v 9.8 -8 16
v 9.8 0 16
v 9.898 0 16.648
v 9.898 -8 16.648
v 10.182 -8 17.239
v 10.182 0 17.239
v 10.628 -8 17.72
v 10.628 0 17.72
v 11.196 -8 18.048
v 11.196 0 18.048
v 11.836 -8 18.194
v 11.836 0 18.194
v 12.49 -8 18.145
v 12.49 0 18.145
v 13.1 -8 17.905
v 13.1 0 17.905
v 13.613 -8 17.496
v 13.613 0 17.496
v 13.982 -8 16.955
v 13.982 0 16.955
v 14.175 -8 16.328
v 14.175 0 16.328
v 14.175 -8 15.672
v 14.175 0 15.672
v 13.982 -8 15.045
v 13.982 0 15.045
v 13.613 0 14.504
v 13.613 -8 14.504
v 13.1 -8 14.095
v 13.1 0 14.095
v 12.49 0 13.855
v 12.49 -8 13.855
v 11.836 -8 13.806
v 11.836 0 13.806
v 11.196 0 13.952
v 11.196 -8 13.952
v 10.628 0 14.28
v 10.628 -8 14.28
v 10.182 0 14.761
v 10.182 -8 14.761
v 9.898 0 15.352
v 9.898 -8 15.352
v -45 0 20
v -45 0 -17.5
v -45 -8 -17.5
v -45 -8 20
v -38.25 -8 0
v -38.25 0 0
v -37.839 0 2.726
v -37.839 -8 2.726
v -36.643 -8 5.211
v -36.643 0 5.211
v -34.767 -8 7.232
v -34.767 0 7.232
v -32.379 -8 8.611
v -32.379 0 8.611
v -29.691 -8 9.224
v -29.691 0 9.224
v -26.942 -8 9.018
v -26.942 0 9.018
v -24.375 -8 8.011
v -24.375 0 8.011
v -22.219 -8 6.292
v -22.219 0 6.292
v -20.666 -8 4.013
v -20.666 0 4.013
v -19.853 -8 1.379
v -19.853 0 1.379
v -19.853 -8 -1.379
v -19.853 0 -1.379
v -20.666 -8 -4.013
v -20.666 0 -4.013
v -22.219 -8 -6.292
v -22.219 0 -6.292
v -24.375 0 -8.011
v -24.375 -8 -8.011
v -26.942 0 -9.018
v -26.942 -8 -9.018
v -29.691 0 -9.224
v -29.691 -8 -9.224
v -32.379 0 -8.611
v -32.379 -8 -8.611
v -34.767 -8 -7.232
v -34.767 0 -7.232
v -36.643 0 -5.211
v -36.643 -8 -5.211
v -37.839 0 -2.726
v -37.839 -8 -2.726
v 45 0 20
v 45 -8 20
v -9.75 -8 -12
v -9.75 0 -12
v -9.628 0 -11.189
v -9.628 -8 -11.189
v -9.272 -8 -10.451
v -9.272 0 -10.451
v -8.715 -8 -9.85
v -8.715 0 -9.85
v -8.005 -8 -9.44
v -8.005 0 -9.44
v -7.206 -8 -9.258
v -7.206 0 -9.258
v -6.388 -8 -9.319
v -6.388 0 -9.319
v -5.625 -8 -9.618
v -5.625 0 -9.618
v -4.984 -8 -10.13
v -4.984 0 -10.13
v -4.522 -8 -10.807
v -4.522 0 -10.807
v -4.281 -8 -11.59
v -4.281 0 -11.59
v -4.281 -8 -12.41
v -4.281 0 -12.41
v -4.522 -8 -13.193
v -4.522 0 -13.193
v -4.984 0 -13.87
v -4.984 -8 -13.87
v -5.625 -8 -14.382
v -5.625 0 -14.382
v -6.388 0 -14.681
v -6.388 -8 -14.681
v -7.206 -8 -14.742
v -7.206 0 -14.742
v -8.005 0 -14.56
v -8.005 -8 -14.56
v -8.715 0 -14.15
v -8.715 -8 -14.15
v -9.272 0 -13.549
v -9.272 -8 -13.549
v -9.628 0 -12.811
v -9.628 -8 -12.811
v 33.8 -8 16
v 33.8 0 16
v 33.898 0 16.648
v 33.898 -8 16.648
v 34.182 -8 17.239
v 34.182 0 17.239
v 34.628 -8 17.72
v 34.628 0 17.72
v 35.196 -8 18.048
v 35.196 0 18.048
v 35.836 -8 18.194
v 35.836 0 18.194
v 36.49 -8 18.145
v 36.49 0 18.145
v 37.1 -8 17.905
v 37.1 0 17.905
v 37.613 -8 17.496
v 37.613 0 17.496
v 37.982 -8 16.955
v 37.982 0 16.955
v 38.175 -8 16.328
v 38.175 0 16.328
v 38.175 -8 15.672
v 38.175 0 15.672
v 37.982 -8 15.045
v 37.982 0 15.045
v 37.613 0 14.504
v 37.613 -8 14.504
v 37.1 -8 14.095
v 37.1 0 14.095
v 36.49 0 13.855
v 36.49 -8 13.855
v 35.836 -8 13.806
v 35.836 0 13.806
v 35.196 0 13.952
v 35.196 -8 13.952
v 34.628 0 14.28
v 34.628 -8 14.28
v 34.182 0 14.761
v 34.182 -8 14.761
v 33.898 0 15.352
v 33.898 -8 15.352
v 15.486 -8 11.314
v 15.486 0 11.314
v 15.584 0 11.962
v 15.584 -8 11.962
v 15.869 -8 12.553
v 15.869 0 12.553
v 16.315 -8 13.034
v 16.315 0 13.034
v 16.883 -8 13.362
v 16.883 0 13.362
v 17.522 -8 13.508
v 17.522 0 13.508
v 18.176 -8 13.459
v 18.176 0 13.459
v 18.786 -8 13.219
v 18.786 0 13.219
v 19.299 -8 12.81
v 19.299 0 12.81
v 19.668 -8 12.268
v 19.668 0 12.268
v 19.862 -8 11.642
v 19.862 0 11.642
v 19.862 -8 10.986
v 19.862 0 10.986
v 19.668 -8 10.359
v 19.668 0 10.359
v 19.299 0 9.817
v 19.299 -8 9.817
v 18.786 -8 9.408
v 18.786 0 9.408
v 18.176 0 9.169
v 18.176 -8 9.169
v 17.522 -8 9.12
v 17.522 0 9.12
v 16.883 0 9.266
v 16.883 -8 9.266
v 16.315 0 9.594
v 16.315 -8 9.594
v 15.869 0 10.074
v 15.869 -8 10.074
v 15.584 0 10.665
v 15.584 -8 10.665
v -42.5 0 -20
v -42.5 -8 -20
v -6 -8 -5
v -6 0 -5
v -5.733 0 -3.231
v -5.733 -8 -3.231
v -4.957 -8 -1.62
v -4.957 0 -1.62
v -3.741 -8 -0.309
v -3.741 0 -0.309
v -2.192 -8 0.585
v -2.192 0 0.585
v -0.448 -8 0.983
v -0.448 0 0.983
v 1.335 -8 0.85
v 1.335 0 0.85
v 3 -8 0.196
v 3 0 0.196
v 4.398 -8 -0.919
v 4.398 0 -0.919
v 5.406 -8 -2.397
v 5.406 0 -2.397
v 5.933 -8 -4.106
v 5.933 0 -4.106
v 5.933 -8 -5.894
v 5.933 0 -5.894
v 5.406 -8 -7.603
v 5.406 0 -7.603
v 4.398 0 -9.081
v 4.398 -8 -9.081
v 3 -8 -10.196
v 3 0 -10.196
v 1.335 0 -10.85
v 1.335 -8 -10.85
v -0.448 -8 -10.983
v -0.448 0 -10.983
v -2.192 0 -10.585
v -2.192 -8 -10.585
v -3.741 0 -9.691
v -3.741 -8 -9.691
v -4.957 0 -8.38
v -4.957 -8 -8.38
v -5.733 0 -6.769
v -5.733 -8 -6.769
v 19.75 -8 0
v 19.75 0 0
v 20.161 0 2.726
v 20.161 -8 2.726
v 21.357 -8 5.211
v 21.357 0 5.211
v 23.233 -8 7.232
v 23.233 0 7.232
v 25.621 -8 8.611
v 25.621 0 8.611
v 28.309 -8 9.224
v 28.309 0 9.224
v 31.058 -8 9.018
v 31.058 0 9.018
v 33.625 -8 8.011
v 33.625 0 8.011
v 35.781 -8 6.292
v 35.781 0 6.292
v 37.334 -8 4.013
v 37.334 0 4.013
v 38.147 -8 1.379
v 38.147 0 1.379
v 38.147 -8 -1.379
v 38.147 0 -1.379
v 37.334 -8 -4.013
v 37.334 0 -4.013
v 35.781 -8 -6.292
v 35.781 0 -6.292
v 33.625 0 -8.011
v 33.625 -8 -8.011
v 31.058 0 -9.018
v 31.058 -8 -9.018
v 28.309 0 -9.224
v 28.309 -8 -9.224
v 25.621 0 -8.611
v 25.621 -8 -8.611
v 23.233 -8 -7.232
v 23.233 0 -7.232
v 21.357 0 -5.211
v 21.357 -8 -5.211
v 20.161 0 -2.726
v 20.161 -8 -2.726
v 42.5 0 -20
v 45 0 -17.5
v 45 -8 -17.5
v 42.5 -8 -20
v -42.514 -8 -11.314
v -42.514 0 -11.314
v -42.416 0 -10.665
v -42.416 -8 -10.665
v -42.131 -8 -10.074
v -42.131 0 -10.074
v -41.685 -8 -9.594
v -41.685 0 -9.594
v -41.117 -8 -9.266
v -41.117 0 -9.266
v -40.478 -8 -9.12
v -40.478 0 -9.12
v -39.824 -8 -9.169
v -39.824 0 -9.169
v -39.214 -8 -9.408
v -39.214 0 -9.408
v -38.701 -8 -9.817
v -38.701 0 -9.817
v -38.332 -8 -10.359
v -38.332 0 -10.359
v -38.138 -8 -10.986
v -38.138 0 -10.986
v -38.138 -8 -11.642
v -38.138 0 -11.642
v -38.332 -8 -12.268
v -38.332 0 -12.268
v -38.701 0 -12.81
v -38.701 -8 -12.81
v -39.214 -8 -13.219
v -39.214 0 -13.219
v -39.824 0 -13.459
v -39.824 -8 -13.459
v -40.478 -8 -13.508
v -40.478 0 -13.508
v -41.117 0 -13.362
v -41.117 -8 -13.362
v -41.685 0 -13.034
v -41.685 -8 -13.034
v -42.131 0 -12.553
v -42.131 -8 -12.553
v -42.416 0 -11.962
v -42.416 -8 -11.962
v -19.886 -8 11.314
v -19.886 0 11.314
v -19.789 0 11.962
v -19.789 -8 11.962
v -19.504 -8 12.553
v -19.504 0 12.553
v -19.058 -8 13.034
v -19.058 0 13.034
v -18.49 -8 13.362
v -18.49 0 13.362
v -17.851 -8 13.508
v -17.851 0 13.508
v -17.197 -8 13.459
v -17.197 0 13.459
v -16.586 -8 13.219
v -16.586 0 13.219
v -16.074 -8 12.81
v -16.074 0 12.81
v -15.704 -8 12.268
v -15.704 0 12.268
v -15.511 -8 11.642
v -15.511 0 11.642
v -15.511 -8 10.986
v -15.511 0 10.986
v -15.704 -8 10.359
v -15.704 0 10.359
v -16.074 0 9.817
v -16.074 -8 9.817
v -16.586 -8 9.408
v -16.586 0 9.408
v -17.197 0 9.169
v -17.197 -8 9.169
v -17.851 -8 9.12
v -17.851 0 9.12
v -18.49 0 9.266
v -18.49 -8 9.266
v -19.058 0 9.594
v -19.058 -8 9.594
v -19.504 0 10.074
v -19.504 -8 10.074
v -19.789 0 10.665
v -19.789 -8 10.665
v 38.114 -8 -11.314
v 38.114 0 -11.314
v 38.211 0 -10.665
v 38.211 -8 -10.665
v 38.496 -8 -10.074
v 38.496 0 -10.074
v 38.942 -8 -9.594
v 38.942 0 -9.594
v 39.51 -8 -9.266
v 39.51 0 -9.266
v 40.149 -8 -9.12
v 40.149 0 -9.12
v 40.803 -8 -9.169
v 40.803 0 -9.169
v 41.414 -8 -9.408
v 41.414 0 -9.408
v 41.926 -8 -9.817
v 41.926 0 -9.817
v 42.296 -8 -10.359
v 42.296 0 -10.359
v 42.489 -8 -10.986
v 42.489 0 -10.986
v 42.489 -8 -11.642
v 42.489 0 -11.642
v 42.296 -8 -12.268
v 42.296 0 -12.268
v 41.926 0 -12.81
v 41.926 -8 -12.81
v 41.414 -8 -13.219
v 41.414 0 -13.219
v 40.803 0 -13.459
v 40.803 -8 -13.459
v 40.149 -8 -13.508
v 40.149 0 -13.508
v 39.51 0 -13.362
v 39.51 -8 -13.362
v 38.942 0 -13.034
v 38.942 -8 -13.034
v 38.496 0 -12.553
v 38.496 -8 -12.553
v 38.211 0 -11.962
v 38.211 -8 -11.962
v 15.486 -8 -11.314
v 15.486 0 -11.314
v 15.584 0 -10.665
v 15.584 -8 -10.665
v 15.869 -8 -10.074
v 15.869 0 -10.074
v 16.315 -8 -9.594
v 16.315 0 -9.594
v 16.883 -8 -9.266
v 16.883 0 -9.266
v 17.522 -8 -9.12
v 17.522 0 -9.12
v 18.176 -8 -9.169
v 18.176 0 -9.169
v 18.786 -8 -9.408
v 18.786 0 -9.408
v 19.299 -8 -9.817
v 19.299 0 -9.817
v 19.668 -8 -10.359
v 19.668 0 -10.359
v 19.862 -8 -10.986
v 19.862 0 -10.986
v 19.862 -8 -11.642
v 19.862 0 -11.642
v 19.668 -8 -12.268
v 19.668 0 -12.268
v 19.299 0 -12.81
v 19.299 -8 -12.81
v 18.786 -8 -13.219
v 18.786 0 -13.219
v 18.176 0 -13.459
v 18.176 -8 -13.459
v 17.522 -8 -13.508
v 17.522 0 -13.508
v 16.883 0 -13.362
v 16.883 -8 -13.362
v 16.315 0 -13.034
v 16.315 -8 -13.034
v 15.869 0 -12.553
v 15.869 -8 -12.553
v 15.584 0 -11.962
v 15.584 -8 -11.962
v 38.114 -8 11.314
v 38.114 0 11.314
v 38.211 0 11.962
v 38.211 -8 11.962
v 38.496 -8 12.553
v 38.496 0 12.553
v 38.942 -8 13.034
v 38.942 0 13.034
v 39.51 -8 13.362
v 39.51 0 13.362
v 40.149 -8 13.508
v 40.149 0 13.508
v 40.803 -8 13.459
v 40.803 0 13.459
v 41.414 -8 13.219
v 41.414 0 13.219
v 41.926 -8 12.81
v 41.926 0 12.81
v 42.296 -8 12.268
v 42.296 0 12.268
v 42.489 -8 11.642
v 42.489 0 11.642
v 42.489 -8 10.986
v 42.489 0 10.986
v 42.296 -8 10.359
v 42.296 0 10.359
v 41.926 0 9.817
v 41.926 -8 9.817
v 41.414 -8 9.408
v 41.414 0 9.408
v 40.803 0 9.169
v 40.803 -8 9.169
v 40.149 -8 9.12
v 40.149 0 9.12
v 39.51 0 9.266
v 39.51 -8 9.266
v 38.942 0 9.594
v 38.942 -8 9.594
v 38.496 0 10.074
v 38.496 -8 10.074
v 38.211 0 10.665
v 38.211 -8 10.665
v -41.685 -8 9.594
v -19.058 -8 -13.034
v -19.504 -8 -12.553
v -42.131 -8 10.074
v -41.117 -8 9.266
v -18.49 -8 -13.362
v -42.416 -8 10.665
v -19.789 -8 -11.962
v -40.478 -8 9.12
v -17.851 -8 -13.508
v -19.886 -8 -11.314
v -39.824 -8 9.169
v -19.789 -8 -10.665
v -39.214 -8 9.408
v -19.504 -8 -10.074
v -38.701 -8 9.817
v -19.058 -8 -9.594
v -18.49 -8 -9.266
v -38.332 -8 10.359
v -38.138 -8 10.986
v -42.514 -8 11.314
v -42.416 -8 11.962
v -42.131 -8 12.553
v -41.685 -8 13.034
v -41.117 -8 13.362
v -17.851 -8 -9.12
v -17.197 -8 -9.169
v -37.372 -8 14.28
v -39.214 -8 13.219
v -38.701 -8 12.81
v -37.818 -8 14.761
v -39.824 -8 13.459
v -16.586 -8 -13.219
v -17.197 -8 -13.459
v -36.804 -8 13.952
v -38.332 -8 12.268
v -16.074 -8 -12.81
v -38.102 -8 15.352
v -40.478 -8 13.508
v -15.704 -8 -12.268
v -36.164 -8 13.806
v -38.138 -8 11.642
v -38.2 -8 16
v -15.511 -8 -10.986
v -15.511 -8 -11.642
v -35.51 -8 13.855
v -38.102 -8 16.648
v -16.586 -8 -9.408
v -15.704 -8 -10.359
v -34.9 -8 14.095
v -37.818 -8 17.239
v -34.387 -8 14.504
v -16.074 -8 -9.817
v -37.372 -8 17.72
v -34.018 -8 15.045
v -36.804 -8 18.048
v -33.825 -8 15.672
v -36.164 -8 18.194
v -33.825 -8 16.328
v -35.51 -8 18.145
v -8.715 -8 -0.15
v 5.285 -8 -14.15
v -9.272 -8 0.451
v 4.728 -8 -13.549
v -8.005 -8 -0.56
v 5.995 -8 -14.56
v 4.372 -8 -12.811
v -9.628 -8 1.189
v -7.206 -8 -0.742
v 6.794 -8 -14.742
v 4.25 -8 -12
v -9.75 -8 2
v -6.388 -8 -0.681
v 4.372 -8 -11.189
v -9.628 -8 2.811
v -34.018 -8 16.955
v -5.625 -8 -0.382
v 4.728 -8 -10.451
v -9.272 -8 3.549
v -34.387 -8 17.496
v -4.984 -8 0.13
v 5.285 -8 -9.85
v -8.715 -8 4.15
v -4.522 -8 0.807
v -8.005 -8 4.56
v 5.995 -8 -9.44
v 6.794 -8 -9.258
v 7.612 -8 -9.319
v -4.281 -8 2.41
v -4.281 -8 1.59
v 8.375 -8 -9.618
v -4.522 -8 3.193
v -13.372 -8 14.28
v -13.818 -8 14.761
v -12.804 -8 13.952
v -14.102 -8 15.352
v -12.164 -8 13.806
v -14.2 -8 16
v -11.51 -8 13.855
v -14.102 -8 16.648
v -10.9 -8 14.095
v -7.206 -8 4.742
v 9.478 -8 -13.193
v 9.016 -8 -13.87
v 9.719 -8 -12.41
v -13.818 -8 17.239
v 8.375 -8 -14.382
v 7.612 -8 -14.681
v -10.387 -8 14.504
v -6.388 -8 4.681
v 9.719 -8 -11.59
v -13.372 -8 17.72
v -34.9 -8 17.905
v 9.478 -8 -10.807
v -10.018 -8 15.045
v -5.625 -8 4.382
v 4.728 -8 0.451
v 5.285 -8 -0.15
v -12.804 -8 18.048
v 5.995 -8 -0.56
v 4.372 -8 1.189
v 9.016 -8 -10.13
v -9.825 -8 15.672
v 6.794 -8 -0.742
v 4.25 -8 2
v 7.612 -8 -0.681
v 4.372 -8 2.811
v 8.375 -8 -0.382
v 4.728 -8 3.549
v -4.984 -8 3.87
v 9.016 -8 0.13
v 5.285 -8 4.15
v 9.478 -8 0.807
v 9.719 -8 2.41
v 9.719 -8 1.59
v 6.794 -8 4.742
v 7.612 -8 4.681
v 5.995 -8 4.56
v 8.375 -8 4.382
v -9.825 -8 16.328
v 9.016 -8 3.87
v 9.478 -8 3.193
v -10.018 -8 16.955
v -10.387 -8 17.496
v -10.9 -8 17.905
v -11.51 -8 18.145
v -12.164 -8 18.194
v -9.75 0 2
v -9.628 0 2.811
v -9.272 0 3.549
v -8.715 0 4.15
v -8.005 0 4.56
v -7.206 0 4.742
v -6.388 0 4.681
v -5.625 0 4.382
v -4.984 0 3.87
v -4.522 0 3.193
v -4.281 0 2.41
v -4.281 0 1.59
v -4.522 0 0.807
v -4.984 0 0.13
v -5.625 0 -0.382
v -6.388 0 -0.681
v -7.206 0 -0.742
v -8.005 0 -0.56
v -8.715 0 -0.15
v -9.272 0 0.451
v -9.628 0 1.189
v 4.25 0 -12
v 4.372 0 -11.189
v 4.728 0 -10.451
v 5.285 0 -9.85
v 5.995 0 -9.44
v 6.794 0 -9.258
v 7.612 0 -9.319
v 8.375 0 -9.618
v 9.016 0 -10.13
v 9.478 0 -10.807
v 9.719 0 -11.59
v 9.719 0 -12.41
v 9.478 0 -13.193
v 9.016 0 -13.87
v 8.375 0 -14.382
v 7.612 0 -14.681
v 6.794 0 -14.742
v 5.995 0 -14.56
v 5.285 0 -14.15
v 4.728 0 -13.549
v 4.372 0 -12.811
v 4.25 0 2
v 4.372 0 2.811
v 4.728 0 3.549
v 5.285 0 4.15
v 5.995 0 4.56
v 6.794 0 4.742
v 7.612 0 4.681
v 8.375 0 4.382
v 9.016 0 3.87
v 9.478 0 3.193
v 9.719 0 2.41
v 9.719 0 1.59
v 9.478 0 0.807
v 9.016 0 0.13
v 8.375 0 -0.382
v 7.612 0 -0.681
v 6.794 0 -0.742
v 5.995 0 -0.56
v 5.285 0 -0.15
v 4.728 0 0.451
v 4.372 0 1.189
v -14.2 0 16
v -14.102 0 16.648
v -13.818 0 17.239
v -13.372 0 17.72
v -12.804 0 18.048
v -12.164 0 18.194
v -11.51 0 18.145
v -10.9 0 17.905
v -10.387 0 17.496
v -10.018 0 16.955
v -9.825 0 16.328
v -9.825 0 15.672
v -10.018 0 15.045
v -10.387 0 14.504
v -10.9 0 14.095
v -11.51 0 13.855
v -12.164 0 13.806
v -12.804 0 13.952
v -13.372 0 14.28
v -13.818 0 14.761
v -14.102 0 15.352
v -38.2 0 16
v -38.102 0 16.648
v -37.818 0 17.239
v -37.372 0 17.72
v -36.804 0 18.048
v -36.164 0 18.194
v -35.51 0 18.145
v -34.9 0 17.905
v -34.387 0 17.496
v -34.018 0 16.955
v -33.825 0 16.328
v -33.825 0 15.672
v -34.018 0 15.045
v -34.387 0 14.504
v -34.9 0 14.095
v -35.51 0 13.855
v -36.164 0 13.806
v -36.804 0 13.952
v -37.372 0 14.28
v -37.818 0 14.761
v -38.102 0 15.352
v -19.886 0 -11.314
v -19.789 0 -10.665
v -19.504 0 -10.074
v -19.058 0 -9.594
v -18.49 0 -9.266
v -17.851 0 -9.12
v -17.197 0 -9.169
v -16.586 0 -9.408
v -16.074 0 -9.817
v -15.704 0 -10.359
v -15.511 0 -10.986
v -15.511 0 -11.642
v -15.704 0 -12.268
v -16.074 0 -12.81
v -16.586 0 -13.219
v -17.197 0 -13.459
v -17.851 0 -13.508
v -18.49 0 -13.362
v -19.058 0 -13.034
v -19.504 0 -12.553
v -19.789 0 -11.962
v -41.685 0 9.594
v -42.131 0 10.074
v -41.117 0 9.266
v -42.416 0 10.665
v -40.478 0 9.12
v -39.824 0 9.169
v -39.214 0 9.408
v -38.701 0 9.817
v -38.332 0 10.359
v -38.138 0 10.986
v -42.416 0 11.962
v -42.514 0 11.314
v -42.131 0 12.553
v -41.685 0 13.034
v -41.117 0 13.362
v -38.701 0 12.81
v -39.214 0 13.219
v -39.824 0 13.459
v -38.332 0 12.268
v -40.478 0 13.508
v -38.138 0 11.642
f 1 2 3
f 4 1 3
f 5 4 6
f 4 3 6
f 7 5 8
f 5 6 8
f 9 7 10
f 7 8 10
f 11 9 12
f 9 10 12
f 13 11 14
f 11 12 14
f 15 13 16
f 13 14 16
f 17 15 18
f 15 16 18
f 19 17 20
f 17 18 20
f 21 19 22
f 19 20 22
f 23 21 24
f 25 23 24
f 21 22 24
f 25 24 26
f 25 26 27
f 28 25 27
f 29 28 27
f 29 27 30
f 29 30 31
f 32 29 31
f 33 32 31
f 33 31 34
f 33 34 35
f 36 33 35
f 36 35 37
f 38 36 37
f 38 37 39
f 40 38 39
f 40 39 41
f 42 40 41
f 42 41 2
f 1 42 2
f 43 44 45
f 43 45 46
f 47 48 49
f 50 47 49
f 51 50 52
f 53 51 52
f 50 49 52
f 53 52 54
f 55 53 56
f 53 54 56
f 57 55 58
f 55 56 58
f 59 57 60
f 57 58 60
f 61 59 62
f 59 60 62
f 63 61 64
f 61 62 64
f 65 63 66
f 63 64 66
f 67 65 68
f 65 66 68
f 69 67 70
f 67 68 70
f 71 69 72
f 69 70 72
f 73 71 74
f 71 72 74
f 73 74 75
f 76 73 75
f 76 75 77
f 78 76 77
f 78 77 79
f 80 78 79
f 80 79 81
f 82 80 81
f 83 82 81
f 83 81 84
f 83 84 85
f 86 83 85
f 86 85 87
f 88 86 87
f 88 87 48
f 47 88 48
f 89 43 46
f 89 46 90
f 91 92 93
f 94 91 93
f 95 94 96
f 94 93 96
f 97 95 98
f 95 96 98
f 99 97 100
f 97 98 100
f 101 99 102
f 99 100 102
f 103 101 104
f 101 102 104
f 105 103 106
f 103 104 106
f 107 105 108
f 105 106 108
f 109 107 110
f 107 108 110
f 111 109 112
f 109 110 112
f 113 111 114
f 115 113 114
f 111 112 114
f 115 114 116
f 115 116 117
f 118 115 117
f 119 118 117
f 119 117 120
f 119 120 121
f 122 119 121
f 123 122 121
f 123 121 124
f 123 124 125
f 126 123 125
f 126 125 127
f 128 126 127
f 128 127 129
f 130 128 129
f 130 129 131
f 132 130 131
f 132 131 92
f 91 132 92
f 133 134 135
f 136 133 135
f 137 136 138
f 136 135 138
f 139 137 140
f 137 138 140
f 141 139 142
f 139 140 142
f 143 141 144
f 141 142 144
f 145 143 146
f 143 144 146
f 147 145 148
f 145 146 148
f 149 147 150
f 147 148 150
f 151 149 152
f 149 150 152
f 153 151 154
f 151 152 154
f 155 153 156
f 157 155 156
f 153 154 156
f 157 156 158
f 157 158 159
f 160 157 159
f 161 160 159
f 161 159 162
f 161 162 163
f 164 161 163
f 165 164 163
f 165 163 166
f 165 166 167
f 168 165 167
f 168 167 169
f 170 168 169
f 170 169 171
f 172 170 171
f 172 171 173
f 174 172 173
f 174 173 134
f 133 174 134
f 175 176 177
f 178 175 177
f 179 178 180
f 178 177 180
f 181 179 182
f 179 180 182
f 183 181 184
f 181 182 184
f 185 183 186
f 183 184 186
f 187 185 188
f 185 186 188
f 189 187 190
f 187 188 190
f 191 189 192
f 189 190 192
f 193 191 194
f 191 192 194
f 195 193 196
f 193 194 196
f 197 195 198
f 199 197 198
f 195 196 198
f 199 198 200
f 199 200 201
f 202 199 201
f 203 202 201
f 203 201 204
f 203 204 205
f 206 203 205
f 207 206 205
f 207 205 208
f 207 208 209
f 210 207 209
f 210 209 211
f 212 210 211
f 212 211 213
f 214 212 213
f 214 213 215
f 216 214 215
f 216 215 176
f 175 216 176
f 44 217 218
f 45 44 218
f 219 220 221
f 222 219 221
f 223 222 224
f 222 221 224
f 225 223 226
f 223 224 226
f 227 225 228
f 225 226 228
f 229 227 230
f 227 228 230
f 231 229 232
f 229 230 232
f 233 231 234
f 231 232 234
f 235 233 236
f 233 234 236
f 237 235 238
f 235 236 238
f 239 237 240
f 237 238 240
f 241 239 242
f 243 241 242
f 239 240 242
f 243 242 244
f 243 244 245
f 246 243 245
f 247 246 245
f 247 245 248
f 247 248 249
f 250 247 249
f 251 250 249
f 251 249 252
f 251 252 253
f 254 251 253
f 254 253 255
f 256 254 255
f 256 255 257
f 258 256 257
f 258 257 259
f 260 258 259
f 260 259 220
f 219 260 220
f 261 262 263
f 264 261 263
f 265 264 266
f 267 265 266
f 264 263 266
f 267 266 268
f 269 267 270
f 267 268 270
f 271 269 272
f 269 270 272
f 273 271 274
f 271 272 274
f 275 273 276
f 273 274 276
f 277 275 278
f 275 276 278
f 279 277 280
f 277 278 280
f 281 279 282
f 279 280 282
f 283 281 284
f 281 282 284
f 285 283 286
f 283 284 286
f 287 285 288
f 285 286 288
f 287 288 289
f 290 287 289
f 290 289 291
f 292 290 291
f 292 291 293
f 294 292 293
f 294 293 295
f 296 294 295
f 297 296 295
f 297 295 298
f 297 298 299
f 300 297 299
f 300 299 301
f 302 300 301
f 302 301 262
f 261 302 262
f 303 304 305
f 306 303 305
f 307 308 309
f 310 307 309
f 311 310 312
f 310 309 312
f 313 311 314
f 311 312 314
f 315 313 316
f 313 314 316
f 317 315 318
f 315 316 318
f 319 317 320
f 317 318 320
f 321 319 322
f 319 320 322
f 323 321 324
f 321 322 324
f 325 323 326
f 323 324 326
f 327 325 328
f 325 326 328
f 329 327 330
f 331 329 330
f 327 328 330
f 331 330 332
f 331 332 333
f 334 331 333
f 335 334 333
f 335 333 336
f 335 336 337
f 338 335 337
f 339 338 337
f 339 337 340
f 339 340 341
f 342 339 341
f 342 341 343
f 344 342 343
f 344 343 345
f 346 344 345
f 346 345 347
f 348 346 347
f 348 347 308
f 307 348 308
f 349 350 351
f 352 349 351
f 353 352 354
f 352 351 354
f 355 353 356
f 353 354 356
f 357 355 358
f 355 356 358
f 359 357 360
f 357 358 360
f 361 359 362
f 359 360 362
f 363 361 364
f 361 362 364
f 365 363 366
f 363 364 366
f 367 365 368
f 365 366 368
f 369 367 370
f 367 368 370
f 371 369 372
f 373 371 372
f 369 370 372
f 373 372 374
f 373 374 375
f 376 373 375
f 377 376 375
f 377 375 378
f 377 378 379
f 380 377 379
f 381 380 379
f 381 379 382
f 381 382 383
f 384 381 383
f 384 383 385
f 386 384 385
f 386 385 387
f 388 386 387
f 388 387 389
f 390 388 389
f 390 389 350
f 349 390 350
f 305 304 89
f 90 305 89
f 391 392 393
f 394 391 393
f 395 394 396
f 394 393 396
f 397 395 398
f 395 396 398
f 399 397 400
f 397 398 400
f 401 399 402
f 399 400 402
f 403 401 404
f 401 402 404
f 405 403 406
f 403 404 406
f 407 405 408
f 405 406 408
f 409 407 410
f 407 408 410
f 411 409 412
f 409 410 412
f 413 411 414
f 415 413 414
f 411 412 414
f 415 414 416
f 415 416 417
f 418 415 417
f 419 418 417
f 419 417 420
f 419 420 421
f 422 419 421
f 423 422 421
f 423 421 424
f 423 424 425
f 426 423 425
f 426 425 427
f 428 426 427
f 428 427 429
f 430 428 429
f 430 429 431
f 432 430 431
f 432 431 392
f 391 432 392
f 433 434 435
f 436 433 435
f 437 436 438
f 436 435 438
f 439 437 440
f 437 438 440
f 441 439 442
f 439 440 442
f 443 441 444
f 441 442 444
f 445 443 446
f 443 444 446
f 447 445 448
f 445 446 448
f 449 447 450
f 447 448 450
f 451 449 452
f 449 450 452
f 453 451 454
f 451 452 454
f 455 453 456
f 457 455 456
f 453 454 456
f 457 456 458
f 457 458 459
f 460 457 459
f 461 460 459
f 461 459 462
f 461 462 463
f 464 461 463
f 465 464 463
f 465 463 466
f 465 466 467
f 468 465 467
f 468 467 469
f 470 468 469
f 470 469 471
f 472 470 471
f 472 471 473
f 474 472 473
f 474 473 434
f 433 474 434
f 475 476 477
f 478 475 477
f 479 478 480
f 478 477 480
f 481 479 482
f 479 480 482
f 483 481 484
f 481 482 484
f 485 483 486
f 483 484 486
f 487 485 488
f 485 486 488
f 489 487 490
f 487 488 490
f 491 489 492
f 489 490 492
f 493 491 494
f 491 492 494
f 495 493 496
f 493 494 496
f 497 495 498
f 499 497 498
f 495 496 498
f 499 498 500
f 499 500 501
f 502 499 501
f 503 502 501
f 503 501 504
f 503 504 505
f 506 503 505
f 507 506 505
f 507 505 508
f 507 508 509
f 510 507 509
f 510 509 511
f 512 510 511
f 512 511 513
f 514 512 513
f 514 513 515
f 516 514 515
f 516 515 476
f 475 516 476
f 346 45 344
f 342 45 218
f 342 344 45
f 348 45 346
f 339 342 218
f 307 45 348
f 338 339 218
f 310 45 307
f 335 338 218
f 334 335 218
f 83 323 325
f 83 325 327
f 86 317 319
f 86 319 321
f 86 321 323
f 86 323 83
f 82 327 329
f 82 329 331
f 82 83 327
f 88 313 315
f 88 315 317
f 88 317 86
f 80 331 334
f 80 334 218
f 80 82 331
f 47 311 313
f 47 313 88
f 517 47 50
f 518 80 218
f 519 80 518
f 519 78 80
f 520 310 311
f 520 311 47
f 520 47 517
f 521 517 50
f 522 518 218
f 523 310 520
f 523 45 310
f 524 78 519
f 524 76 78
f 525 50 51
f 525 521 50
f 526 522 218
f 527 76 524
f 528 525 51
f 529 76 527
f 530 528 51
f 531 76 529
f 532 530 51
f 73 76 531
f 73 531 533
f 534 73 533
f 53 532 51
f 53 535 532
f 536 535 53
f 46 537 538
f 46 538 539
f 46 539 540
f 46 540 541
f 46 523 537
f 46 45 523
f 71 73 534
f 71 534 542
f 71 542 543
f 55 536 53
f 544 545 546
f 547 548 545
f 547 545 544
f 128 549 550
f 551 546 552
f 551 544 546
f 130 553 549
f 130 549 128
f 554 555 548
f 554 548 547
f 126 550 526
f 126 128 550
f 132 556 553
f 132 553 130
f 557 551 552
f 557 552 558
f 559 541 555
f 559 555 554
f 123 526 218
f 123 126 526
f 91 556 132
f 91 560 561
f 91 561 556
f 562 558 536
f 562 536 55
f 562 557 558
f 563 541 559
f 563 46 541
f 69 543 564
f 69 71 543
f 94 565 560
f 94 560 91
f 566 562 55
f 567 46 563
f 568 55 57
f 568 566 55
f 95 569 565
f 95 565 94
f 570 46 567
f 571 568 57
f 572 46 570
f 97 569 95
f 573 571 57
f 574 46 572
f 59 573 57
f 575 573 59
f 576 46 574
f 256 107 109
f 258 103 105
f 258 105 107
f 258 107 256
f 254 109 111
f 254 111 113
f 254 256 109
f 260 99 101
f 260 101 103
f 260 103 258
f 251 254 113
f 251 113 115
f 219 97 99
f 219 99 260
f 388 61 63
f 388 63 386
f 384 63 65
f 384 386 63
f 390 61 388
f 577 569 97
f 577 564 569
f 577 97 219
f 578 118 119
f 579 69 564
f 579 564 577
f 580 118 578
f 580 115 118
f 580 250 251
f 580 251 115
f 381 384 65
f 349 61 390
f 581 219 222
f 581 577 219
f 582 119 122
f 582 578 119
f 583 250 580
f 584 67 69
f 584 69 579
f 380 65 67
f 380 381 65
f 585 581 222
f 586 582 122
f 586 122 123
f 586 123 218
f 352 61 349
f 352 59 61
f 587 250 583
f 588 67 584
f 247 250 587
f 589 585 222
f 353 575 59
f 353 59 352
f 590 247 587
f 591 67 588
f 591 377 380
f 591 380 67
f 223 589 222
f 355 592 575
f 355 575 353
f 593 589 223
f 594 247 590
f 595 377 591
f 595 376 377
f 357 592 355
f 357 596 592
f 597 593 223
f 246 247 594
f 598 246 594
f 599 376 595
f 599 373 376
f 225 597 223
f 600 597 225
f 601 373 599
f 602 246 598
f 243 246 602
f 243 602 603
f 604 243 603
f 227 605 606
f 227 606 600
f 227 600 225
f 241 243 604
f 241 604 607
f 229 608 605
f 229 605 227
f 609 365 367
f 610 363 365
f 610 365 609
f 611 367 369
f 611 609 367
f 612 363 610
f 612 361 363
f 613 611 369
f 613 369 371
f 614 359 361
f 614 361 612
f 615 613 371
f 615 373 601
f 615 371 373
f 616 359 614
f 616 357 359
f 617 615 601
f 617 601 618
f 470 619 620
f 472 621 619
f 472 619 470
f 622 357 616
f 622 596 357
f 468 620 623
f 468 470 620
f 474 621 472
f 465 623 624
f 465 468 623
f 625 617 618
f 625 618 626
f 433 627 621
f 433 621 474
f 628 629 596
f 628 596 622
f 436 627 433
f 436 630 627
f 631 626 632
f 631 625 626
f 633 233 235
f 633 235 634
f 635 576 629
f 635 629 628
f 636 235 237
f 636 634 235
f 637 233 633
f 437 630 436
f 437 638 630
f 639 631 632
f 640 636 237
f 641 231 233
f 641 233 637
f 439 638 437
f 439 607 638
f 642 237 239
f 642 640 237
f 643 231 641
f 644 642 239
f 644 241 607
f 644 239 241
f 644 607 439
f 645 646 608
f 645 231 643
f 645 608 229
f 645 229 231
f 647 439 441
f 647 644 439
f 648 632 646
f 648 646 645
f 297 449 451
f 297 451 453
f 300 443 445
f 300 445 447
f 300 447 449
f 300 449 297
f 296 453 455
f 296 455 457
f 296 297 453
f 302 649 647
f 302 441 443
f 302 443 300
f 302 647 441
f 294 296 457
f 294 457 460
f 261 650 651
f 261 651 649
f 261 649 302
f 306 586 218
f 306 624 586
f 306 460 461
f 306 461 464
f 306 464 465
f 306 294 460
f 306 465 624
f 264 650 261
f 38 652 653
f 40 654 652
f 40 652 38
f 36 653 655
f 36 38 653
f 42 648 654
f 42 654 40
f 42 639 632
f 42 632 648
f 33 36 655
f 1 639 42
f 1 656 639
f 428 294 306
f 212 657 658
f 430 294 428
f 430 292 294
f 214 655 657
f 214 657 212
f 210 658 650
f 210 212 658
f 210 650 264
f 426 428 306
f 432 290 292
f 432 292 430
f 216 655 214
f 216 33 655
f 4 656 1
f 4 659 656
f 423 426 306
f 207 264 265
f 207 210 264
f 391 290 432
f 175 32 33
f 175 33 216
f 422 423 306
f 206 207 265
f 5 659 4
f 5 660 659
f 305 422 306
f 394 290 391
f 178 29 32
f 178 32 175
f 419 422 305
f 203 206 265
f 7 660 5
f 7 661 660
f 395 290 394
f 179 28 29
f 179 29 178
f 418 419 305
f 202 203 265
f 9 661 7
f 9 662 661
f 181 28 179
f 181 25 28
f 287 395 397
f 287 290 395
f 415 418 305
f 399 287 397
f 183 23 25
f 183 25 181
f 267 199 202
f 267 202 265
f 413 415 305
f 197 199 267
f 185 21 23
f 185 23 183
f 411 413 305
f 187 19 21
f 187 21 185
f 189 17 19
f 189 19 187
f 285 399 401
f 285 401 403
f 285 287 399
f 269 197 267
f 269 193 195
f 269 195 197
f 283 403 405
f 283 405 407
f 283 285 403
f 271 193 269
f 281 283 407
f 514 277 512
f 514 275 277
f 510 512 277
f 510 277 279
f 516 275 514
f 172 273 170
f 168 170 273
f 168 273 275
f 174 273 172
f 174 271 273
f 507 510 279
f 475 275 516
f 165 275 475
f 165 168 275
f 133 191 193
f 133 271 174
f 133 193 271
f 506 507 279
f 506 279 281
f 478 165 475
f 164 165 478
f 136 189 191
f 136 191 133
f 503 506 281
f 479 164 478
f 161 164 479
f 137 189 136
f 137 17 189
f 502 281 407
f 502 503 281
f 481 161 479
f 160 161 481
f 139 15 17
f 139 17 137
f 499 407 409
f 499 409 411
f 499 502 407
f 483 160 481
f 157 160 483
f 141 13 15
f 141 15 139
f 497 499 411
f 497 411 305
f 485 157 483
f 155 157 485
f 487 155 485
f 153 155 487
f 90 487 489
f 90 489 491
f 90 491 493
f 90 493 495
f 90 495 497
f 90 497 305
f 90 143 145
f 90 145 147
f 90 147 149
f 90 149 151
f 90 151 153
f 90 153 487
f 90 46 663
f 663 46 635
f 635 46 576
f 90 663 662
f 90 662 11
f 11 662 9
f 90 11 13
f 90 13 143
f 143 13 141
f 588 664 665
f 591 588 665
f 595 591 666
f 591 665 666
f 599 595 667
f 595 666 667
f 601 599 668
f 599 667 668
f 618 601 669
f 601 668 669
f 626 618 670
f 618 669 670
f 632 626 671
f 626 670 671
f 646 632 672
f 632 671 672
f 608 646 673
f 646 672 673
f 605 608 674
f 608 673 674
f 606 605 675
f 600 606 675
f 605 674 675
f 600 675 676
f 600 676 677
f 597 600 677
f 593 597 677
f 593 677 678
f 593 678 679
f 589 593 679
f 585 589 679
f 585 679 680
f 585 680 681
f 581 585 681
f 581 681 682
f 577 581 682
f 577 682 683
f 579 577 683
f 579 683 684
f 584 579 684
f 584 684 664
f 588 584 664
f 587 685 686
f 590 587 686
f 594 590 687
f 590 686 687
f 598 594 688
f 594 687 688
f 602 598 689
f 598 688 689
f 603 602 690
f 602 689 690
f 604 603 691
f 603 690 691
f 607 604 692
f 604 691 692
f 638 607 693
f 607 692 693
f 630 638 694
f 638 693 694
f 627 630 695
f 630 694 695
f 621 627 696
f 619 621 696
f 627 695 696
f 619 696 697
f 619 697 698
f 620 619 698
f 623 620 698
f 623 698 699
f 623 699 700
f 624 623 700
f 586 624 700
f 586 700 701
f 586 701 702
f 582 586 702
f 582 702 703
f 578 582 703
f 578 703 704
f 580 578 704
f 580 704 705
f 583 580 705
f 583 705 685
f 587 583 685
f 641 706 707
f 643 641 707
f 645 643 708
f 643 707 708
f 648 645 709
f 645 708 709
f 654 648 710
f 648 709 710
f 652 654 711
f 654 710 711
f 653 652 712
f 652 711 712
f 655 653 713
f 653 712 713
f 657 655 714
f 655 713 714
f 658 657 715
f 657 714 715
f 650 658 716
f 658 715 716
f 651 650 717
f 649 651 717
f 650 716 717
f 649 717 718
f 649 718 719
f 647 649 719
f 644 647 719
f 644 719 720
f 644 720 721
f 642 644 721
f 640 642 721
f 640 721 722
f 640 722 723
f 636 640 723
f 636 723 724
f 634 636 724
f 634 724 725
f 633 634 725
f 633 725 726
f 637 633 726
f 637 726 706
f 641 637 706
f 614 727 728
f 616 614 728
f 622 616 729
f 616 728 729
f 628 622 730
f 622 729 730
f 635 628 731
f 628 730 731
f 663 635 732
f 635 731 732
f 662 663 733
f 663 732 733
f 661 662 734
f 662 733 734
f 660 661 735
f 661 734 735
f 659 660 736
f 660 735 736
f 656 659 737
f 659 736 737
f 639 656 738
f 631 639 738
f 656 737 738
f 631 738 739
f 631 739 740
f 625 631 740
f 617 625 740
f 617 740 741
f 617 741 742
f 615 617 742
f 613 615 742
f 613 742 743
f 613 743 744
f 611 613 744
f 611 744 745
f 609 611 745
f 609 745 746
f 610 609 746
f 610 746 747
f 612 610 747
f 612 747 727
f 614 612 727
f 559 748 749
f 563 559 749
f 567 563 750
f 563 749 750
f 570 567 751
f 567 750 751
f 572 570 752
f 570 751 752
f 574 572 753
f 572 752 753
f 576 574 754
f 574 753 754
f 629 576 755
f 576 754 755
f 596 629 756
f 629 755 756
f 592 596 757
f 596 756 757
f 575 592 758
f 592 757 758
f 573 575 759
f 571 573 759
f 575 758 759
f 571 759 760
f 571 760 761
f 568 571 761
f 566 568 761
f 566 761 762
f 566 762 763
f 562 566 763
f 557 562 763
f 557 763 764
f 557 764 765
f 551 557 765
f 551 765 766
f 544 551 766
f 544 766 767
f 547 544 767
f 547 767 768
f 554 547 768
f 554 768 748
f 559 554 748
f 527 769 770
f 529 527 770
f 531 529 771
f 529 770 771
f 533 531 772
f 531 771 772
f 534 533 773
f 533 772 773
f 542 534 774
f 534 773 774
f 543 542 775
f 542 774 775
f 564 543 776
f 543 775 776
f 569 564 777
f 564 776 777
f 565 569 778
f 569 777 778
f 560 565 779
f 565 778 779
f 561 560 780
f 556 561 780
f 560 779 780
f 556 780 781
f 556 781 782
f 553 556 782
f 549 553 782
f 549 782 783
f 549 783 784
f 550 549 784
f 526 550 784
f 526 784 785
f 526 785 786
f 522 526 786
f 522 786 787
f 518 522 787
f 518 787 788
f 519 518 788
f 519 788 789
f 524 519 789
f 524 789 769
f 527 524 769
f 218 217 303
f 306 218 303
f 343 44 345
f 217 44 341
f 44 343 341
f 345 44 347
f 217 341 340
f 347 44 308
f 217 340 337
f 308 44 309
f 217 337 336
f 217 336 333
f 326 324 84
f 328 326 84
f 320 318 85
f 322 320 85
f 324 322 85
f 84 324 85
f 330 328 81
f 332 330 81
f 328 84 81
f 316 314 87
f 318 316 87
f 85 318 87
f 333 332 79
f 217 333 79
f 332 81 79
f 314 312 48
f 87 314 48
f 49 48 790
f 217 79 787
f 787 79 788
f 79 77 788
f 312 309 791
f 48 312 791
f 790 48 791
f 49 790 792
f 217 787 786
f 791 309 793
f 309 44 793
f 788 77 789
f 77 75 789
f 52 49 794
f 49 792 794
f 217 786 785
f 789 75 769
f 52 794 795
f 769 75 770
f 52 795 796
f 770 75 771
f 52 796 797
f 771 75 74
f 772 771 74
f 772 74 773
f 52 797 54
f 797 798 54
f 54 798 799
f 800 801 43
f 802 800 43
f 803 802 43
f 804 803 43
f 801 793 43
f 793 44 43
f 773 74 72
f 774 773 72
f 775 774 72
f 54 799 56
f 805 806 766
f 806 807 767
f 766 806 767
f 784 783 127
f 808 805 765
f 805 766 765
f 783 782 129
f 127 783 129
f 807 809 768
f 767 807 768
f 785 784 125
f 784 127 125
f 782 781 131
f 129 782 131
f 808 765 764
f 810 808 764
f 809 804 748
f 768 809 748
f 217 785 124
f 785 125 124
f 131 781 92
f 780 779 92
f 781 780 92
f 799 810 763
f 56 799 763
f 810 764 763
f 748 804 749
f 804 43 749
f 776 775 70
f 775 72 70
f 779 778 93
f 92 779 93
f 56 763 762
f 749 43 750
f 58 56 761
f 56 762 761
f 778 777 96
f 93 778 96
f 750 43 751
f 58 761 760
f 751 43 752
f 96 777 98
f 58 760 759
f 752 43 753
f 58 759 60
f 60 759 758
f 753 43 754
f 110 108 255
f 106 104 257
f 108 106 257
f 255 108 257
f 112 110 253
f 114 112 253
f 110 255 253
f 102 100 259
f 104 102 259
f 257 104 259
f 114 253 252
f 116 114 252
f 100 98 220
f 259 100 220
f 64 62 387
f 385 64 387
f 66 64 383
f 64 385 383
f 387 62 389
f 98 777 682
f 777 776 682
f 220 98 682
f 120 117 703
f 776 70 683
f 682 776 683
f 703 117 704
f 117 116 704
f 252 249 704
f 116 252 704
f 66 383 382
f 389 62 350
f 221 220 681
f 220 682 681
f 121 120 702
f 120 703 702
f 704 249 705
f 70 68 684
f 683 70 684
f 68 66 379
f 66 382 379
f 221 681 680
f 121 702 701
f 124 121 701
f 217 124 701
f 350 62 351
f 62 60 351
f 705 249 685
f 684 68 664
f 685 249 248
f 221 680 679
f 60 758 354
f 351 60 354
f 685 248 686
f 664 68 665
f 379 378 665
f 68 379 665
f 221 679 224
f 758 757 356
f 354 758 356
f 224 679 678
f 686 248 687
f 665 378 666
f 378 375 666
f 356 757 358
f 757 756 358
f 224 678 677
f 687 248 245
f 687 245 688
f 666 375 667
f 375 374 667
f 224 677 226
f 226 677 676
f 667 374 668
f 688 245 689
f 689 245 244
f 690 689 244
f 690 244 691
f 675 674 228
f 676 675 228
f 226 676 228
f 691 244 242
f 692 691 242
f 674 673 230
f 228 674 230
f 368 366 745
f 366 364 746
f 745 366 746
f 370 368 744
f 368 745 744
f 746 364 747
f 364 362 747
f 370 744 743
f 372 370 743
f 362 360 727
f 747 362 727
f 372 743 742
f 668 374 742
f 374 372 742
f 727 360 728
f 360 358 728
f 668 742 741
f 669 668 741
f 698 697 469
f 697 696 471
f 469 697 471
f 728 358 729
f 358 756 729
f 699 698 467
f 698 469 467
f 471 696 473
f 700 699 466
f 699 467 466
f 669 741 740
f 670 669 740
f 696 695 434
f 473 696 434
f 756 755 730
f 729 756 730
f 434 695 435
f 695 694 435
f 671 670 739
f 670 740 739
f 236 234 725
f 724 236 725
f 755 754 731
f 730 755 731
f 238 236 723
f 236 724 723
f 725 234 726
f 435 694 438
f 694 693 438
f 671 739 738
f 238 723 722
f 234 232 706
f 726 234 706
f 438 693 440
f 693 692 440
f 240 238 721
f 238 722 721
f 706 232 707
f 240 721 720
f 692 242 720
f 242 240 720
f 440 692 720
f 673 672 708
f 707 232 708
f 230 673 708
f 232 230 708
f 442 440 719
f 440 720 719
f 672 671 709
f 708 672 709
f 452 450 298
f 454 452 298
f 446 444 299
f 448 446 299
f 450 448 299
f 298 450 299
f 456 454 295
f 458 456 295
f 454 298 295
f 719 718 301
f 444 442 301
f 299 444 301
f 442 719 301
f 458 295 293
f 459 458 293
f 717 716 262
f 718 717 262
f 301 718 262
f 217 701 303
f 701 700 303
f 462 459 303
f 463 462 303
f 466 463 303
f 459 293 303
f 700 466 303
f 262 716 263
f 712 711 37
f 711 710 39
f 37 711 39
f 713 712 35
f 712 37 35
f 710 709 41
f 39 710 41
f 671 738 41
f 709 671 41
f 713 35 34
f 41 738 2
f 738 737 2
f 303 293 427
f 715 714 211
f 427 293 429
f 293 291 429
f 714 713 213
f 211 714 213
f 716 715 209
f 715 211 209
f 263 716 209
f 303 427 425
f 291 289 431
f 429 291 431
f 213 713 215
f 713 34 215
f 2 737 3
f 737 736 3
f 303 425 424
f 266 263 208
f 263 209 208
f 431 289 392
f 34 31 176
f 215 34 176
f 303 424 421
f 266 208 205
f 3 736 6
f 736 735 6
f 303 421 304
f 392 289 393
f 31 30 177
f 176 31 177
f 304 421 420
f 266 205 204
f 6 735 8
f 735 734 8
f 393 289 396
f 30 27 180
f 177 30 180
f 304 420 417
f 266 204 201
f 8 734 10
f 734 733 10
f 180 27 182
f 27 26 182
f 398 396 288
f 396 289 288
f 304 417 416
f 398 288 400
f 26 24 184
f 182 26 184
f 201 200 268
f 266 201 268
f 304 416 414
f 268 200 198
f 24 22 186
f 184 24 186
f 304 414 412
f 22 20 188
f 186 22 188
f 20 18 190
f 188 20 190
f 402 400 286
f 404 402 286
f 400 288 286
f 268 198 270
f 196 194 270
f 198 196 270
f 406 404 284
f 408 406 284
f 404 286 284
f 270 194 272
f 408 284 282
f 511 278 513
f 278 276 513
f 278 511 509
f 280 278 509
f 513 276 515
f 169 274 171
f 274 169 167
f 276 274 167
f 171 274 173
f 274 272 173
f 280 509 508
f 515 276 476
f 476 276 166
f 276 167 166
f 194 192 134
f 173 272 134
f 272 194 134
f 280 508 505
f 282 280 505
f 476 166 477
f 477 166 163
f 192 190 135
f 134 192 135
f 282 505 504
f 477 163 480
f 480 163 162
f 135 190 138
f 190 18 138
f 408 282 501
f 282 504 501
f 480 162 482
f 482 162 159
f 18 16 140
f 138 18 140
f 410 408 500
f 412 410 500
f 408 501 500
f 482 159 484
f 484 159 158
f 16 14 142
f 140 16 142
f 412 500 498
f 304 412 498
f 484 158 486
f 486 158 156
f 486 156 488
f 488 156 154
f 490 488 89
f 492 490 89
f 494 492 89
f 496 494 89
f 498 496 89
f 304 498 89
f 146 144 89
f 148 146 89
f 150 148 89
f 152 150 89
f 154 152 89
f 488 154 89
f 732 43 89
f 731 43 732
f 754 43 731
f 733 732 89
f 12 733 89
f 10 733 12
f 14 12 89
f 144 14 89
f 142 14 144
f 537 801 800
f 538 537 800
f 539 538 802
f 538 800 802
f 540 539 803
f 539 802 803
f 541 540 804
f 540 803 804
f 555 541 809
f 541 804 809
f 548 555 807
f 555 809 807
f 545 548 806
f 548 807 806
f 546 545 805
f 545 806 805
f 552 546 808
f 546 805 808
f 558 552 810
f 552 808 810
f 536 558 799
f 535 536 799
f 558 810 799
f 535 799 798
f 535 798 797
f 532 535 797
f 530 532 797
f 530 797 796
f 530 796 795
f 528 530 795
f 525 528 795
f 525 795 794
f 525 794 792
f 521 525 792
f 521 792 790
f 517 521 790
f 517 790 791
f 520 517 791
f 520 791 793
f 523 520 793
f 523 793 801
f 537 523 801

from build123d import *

# Parameters (mm, degrees)
F0_W     = 90
F0_H     = 40
F1_DEPTH = 8
F2_SIZE  = 2.5
F4_D     = 4.4
F5_D     = 4.4
F6_D     = 18.5
F7_D     = 12
F8_D     = 5.5


with BuildPart() as f1:
    # F0 (on Front) → F1 (new body)
    with BuildSketch(Plane.XZ):
        Rectangle(F0_W, F0_H)
    extrude(amount=F1_DEPTH)

    # F2
    f2_edges = [f1.edges().sort_by_distance(p)[0] for p in [
        (-45, -4, -20),
        (45, -4, -20),
    ]]
    chamfer(f2_edges, length=F2_SIZE)

    # F4 (through all)
    with Locations(Plane.XZ.offset(8)):
        with Locations((-36, 16), (-12, 16), (12, 16), (36, 16)):
            Hole(F4_D / 2)

    # F5 (through all)
    with Locations(Plane.XZ.offset(8)):
        with Locations((-40.313708499, 11.313708499), (-17.686291501, 11.313708499), (-17.686291501, -11.313708499), (-40.313708499, -11.313708499), (17.686291501, 11.313708499), (40.313708499, 11.313708499), (40.313708499, -11.313708499), (17.686291501, -11.313708499)):
            Hole(F5_D / 2)

    # F6 (through all)
    with Locations(Plane.XZ.offset(8)):
        with Locations((-29, 0), (29, 0)):
            Hole(F6_D / 2)

    # F7 (through all)
    with Locations(Plane.XZ.offset(8)):
        with Locations((0, -5)):
            Hole(F7_D / 2)

    # F8 (through all)
    with Locations(Plane.XZ.offset(8)):
        with Locations((7, -12), (-7, 2), (7, 2), (-7, -12)):
            Hole(F8_D / 2)


solid = f1.part
